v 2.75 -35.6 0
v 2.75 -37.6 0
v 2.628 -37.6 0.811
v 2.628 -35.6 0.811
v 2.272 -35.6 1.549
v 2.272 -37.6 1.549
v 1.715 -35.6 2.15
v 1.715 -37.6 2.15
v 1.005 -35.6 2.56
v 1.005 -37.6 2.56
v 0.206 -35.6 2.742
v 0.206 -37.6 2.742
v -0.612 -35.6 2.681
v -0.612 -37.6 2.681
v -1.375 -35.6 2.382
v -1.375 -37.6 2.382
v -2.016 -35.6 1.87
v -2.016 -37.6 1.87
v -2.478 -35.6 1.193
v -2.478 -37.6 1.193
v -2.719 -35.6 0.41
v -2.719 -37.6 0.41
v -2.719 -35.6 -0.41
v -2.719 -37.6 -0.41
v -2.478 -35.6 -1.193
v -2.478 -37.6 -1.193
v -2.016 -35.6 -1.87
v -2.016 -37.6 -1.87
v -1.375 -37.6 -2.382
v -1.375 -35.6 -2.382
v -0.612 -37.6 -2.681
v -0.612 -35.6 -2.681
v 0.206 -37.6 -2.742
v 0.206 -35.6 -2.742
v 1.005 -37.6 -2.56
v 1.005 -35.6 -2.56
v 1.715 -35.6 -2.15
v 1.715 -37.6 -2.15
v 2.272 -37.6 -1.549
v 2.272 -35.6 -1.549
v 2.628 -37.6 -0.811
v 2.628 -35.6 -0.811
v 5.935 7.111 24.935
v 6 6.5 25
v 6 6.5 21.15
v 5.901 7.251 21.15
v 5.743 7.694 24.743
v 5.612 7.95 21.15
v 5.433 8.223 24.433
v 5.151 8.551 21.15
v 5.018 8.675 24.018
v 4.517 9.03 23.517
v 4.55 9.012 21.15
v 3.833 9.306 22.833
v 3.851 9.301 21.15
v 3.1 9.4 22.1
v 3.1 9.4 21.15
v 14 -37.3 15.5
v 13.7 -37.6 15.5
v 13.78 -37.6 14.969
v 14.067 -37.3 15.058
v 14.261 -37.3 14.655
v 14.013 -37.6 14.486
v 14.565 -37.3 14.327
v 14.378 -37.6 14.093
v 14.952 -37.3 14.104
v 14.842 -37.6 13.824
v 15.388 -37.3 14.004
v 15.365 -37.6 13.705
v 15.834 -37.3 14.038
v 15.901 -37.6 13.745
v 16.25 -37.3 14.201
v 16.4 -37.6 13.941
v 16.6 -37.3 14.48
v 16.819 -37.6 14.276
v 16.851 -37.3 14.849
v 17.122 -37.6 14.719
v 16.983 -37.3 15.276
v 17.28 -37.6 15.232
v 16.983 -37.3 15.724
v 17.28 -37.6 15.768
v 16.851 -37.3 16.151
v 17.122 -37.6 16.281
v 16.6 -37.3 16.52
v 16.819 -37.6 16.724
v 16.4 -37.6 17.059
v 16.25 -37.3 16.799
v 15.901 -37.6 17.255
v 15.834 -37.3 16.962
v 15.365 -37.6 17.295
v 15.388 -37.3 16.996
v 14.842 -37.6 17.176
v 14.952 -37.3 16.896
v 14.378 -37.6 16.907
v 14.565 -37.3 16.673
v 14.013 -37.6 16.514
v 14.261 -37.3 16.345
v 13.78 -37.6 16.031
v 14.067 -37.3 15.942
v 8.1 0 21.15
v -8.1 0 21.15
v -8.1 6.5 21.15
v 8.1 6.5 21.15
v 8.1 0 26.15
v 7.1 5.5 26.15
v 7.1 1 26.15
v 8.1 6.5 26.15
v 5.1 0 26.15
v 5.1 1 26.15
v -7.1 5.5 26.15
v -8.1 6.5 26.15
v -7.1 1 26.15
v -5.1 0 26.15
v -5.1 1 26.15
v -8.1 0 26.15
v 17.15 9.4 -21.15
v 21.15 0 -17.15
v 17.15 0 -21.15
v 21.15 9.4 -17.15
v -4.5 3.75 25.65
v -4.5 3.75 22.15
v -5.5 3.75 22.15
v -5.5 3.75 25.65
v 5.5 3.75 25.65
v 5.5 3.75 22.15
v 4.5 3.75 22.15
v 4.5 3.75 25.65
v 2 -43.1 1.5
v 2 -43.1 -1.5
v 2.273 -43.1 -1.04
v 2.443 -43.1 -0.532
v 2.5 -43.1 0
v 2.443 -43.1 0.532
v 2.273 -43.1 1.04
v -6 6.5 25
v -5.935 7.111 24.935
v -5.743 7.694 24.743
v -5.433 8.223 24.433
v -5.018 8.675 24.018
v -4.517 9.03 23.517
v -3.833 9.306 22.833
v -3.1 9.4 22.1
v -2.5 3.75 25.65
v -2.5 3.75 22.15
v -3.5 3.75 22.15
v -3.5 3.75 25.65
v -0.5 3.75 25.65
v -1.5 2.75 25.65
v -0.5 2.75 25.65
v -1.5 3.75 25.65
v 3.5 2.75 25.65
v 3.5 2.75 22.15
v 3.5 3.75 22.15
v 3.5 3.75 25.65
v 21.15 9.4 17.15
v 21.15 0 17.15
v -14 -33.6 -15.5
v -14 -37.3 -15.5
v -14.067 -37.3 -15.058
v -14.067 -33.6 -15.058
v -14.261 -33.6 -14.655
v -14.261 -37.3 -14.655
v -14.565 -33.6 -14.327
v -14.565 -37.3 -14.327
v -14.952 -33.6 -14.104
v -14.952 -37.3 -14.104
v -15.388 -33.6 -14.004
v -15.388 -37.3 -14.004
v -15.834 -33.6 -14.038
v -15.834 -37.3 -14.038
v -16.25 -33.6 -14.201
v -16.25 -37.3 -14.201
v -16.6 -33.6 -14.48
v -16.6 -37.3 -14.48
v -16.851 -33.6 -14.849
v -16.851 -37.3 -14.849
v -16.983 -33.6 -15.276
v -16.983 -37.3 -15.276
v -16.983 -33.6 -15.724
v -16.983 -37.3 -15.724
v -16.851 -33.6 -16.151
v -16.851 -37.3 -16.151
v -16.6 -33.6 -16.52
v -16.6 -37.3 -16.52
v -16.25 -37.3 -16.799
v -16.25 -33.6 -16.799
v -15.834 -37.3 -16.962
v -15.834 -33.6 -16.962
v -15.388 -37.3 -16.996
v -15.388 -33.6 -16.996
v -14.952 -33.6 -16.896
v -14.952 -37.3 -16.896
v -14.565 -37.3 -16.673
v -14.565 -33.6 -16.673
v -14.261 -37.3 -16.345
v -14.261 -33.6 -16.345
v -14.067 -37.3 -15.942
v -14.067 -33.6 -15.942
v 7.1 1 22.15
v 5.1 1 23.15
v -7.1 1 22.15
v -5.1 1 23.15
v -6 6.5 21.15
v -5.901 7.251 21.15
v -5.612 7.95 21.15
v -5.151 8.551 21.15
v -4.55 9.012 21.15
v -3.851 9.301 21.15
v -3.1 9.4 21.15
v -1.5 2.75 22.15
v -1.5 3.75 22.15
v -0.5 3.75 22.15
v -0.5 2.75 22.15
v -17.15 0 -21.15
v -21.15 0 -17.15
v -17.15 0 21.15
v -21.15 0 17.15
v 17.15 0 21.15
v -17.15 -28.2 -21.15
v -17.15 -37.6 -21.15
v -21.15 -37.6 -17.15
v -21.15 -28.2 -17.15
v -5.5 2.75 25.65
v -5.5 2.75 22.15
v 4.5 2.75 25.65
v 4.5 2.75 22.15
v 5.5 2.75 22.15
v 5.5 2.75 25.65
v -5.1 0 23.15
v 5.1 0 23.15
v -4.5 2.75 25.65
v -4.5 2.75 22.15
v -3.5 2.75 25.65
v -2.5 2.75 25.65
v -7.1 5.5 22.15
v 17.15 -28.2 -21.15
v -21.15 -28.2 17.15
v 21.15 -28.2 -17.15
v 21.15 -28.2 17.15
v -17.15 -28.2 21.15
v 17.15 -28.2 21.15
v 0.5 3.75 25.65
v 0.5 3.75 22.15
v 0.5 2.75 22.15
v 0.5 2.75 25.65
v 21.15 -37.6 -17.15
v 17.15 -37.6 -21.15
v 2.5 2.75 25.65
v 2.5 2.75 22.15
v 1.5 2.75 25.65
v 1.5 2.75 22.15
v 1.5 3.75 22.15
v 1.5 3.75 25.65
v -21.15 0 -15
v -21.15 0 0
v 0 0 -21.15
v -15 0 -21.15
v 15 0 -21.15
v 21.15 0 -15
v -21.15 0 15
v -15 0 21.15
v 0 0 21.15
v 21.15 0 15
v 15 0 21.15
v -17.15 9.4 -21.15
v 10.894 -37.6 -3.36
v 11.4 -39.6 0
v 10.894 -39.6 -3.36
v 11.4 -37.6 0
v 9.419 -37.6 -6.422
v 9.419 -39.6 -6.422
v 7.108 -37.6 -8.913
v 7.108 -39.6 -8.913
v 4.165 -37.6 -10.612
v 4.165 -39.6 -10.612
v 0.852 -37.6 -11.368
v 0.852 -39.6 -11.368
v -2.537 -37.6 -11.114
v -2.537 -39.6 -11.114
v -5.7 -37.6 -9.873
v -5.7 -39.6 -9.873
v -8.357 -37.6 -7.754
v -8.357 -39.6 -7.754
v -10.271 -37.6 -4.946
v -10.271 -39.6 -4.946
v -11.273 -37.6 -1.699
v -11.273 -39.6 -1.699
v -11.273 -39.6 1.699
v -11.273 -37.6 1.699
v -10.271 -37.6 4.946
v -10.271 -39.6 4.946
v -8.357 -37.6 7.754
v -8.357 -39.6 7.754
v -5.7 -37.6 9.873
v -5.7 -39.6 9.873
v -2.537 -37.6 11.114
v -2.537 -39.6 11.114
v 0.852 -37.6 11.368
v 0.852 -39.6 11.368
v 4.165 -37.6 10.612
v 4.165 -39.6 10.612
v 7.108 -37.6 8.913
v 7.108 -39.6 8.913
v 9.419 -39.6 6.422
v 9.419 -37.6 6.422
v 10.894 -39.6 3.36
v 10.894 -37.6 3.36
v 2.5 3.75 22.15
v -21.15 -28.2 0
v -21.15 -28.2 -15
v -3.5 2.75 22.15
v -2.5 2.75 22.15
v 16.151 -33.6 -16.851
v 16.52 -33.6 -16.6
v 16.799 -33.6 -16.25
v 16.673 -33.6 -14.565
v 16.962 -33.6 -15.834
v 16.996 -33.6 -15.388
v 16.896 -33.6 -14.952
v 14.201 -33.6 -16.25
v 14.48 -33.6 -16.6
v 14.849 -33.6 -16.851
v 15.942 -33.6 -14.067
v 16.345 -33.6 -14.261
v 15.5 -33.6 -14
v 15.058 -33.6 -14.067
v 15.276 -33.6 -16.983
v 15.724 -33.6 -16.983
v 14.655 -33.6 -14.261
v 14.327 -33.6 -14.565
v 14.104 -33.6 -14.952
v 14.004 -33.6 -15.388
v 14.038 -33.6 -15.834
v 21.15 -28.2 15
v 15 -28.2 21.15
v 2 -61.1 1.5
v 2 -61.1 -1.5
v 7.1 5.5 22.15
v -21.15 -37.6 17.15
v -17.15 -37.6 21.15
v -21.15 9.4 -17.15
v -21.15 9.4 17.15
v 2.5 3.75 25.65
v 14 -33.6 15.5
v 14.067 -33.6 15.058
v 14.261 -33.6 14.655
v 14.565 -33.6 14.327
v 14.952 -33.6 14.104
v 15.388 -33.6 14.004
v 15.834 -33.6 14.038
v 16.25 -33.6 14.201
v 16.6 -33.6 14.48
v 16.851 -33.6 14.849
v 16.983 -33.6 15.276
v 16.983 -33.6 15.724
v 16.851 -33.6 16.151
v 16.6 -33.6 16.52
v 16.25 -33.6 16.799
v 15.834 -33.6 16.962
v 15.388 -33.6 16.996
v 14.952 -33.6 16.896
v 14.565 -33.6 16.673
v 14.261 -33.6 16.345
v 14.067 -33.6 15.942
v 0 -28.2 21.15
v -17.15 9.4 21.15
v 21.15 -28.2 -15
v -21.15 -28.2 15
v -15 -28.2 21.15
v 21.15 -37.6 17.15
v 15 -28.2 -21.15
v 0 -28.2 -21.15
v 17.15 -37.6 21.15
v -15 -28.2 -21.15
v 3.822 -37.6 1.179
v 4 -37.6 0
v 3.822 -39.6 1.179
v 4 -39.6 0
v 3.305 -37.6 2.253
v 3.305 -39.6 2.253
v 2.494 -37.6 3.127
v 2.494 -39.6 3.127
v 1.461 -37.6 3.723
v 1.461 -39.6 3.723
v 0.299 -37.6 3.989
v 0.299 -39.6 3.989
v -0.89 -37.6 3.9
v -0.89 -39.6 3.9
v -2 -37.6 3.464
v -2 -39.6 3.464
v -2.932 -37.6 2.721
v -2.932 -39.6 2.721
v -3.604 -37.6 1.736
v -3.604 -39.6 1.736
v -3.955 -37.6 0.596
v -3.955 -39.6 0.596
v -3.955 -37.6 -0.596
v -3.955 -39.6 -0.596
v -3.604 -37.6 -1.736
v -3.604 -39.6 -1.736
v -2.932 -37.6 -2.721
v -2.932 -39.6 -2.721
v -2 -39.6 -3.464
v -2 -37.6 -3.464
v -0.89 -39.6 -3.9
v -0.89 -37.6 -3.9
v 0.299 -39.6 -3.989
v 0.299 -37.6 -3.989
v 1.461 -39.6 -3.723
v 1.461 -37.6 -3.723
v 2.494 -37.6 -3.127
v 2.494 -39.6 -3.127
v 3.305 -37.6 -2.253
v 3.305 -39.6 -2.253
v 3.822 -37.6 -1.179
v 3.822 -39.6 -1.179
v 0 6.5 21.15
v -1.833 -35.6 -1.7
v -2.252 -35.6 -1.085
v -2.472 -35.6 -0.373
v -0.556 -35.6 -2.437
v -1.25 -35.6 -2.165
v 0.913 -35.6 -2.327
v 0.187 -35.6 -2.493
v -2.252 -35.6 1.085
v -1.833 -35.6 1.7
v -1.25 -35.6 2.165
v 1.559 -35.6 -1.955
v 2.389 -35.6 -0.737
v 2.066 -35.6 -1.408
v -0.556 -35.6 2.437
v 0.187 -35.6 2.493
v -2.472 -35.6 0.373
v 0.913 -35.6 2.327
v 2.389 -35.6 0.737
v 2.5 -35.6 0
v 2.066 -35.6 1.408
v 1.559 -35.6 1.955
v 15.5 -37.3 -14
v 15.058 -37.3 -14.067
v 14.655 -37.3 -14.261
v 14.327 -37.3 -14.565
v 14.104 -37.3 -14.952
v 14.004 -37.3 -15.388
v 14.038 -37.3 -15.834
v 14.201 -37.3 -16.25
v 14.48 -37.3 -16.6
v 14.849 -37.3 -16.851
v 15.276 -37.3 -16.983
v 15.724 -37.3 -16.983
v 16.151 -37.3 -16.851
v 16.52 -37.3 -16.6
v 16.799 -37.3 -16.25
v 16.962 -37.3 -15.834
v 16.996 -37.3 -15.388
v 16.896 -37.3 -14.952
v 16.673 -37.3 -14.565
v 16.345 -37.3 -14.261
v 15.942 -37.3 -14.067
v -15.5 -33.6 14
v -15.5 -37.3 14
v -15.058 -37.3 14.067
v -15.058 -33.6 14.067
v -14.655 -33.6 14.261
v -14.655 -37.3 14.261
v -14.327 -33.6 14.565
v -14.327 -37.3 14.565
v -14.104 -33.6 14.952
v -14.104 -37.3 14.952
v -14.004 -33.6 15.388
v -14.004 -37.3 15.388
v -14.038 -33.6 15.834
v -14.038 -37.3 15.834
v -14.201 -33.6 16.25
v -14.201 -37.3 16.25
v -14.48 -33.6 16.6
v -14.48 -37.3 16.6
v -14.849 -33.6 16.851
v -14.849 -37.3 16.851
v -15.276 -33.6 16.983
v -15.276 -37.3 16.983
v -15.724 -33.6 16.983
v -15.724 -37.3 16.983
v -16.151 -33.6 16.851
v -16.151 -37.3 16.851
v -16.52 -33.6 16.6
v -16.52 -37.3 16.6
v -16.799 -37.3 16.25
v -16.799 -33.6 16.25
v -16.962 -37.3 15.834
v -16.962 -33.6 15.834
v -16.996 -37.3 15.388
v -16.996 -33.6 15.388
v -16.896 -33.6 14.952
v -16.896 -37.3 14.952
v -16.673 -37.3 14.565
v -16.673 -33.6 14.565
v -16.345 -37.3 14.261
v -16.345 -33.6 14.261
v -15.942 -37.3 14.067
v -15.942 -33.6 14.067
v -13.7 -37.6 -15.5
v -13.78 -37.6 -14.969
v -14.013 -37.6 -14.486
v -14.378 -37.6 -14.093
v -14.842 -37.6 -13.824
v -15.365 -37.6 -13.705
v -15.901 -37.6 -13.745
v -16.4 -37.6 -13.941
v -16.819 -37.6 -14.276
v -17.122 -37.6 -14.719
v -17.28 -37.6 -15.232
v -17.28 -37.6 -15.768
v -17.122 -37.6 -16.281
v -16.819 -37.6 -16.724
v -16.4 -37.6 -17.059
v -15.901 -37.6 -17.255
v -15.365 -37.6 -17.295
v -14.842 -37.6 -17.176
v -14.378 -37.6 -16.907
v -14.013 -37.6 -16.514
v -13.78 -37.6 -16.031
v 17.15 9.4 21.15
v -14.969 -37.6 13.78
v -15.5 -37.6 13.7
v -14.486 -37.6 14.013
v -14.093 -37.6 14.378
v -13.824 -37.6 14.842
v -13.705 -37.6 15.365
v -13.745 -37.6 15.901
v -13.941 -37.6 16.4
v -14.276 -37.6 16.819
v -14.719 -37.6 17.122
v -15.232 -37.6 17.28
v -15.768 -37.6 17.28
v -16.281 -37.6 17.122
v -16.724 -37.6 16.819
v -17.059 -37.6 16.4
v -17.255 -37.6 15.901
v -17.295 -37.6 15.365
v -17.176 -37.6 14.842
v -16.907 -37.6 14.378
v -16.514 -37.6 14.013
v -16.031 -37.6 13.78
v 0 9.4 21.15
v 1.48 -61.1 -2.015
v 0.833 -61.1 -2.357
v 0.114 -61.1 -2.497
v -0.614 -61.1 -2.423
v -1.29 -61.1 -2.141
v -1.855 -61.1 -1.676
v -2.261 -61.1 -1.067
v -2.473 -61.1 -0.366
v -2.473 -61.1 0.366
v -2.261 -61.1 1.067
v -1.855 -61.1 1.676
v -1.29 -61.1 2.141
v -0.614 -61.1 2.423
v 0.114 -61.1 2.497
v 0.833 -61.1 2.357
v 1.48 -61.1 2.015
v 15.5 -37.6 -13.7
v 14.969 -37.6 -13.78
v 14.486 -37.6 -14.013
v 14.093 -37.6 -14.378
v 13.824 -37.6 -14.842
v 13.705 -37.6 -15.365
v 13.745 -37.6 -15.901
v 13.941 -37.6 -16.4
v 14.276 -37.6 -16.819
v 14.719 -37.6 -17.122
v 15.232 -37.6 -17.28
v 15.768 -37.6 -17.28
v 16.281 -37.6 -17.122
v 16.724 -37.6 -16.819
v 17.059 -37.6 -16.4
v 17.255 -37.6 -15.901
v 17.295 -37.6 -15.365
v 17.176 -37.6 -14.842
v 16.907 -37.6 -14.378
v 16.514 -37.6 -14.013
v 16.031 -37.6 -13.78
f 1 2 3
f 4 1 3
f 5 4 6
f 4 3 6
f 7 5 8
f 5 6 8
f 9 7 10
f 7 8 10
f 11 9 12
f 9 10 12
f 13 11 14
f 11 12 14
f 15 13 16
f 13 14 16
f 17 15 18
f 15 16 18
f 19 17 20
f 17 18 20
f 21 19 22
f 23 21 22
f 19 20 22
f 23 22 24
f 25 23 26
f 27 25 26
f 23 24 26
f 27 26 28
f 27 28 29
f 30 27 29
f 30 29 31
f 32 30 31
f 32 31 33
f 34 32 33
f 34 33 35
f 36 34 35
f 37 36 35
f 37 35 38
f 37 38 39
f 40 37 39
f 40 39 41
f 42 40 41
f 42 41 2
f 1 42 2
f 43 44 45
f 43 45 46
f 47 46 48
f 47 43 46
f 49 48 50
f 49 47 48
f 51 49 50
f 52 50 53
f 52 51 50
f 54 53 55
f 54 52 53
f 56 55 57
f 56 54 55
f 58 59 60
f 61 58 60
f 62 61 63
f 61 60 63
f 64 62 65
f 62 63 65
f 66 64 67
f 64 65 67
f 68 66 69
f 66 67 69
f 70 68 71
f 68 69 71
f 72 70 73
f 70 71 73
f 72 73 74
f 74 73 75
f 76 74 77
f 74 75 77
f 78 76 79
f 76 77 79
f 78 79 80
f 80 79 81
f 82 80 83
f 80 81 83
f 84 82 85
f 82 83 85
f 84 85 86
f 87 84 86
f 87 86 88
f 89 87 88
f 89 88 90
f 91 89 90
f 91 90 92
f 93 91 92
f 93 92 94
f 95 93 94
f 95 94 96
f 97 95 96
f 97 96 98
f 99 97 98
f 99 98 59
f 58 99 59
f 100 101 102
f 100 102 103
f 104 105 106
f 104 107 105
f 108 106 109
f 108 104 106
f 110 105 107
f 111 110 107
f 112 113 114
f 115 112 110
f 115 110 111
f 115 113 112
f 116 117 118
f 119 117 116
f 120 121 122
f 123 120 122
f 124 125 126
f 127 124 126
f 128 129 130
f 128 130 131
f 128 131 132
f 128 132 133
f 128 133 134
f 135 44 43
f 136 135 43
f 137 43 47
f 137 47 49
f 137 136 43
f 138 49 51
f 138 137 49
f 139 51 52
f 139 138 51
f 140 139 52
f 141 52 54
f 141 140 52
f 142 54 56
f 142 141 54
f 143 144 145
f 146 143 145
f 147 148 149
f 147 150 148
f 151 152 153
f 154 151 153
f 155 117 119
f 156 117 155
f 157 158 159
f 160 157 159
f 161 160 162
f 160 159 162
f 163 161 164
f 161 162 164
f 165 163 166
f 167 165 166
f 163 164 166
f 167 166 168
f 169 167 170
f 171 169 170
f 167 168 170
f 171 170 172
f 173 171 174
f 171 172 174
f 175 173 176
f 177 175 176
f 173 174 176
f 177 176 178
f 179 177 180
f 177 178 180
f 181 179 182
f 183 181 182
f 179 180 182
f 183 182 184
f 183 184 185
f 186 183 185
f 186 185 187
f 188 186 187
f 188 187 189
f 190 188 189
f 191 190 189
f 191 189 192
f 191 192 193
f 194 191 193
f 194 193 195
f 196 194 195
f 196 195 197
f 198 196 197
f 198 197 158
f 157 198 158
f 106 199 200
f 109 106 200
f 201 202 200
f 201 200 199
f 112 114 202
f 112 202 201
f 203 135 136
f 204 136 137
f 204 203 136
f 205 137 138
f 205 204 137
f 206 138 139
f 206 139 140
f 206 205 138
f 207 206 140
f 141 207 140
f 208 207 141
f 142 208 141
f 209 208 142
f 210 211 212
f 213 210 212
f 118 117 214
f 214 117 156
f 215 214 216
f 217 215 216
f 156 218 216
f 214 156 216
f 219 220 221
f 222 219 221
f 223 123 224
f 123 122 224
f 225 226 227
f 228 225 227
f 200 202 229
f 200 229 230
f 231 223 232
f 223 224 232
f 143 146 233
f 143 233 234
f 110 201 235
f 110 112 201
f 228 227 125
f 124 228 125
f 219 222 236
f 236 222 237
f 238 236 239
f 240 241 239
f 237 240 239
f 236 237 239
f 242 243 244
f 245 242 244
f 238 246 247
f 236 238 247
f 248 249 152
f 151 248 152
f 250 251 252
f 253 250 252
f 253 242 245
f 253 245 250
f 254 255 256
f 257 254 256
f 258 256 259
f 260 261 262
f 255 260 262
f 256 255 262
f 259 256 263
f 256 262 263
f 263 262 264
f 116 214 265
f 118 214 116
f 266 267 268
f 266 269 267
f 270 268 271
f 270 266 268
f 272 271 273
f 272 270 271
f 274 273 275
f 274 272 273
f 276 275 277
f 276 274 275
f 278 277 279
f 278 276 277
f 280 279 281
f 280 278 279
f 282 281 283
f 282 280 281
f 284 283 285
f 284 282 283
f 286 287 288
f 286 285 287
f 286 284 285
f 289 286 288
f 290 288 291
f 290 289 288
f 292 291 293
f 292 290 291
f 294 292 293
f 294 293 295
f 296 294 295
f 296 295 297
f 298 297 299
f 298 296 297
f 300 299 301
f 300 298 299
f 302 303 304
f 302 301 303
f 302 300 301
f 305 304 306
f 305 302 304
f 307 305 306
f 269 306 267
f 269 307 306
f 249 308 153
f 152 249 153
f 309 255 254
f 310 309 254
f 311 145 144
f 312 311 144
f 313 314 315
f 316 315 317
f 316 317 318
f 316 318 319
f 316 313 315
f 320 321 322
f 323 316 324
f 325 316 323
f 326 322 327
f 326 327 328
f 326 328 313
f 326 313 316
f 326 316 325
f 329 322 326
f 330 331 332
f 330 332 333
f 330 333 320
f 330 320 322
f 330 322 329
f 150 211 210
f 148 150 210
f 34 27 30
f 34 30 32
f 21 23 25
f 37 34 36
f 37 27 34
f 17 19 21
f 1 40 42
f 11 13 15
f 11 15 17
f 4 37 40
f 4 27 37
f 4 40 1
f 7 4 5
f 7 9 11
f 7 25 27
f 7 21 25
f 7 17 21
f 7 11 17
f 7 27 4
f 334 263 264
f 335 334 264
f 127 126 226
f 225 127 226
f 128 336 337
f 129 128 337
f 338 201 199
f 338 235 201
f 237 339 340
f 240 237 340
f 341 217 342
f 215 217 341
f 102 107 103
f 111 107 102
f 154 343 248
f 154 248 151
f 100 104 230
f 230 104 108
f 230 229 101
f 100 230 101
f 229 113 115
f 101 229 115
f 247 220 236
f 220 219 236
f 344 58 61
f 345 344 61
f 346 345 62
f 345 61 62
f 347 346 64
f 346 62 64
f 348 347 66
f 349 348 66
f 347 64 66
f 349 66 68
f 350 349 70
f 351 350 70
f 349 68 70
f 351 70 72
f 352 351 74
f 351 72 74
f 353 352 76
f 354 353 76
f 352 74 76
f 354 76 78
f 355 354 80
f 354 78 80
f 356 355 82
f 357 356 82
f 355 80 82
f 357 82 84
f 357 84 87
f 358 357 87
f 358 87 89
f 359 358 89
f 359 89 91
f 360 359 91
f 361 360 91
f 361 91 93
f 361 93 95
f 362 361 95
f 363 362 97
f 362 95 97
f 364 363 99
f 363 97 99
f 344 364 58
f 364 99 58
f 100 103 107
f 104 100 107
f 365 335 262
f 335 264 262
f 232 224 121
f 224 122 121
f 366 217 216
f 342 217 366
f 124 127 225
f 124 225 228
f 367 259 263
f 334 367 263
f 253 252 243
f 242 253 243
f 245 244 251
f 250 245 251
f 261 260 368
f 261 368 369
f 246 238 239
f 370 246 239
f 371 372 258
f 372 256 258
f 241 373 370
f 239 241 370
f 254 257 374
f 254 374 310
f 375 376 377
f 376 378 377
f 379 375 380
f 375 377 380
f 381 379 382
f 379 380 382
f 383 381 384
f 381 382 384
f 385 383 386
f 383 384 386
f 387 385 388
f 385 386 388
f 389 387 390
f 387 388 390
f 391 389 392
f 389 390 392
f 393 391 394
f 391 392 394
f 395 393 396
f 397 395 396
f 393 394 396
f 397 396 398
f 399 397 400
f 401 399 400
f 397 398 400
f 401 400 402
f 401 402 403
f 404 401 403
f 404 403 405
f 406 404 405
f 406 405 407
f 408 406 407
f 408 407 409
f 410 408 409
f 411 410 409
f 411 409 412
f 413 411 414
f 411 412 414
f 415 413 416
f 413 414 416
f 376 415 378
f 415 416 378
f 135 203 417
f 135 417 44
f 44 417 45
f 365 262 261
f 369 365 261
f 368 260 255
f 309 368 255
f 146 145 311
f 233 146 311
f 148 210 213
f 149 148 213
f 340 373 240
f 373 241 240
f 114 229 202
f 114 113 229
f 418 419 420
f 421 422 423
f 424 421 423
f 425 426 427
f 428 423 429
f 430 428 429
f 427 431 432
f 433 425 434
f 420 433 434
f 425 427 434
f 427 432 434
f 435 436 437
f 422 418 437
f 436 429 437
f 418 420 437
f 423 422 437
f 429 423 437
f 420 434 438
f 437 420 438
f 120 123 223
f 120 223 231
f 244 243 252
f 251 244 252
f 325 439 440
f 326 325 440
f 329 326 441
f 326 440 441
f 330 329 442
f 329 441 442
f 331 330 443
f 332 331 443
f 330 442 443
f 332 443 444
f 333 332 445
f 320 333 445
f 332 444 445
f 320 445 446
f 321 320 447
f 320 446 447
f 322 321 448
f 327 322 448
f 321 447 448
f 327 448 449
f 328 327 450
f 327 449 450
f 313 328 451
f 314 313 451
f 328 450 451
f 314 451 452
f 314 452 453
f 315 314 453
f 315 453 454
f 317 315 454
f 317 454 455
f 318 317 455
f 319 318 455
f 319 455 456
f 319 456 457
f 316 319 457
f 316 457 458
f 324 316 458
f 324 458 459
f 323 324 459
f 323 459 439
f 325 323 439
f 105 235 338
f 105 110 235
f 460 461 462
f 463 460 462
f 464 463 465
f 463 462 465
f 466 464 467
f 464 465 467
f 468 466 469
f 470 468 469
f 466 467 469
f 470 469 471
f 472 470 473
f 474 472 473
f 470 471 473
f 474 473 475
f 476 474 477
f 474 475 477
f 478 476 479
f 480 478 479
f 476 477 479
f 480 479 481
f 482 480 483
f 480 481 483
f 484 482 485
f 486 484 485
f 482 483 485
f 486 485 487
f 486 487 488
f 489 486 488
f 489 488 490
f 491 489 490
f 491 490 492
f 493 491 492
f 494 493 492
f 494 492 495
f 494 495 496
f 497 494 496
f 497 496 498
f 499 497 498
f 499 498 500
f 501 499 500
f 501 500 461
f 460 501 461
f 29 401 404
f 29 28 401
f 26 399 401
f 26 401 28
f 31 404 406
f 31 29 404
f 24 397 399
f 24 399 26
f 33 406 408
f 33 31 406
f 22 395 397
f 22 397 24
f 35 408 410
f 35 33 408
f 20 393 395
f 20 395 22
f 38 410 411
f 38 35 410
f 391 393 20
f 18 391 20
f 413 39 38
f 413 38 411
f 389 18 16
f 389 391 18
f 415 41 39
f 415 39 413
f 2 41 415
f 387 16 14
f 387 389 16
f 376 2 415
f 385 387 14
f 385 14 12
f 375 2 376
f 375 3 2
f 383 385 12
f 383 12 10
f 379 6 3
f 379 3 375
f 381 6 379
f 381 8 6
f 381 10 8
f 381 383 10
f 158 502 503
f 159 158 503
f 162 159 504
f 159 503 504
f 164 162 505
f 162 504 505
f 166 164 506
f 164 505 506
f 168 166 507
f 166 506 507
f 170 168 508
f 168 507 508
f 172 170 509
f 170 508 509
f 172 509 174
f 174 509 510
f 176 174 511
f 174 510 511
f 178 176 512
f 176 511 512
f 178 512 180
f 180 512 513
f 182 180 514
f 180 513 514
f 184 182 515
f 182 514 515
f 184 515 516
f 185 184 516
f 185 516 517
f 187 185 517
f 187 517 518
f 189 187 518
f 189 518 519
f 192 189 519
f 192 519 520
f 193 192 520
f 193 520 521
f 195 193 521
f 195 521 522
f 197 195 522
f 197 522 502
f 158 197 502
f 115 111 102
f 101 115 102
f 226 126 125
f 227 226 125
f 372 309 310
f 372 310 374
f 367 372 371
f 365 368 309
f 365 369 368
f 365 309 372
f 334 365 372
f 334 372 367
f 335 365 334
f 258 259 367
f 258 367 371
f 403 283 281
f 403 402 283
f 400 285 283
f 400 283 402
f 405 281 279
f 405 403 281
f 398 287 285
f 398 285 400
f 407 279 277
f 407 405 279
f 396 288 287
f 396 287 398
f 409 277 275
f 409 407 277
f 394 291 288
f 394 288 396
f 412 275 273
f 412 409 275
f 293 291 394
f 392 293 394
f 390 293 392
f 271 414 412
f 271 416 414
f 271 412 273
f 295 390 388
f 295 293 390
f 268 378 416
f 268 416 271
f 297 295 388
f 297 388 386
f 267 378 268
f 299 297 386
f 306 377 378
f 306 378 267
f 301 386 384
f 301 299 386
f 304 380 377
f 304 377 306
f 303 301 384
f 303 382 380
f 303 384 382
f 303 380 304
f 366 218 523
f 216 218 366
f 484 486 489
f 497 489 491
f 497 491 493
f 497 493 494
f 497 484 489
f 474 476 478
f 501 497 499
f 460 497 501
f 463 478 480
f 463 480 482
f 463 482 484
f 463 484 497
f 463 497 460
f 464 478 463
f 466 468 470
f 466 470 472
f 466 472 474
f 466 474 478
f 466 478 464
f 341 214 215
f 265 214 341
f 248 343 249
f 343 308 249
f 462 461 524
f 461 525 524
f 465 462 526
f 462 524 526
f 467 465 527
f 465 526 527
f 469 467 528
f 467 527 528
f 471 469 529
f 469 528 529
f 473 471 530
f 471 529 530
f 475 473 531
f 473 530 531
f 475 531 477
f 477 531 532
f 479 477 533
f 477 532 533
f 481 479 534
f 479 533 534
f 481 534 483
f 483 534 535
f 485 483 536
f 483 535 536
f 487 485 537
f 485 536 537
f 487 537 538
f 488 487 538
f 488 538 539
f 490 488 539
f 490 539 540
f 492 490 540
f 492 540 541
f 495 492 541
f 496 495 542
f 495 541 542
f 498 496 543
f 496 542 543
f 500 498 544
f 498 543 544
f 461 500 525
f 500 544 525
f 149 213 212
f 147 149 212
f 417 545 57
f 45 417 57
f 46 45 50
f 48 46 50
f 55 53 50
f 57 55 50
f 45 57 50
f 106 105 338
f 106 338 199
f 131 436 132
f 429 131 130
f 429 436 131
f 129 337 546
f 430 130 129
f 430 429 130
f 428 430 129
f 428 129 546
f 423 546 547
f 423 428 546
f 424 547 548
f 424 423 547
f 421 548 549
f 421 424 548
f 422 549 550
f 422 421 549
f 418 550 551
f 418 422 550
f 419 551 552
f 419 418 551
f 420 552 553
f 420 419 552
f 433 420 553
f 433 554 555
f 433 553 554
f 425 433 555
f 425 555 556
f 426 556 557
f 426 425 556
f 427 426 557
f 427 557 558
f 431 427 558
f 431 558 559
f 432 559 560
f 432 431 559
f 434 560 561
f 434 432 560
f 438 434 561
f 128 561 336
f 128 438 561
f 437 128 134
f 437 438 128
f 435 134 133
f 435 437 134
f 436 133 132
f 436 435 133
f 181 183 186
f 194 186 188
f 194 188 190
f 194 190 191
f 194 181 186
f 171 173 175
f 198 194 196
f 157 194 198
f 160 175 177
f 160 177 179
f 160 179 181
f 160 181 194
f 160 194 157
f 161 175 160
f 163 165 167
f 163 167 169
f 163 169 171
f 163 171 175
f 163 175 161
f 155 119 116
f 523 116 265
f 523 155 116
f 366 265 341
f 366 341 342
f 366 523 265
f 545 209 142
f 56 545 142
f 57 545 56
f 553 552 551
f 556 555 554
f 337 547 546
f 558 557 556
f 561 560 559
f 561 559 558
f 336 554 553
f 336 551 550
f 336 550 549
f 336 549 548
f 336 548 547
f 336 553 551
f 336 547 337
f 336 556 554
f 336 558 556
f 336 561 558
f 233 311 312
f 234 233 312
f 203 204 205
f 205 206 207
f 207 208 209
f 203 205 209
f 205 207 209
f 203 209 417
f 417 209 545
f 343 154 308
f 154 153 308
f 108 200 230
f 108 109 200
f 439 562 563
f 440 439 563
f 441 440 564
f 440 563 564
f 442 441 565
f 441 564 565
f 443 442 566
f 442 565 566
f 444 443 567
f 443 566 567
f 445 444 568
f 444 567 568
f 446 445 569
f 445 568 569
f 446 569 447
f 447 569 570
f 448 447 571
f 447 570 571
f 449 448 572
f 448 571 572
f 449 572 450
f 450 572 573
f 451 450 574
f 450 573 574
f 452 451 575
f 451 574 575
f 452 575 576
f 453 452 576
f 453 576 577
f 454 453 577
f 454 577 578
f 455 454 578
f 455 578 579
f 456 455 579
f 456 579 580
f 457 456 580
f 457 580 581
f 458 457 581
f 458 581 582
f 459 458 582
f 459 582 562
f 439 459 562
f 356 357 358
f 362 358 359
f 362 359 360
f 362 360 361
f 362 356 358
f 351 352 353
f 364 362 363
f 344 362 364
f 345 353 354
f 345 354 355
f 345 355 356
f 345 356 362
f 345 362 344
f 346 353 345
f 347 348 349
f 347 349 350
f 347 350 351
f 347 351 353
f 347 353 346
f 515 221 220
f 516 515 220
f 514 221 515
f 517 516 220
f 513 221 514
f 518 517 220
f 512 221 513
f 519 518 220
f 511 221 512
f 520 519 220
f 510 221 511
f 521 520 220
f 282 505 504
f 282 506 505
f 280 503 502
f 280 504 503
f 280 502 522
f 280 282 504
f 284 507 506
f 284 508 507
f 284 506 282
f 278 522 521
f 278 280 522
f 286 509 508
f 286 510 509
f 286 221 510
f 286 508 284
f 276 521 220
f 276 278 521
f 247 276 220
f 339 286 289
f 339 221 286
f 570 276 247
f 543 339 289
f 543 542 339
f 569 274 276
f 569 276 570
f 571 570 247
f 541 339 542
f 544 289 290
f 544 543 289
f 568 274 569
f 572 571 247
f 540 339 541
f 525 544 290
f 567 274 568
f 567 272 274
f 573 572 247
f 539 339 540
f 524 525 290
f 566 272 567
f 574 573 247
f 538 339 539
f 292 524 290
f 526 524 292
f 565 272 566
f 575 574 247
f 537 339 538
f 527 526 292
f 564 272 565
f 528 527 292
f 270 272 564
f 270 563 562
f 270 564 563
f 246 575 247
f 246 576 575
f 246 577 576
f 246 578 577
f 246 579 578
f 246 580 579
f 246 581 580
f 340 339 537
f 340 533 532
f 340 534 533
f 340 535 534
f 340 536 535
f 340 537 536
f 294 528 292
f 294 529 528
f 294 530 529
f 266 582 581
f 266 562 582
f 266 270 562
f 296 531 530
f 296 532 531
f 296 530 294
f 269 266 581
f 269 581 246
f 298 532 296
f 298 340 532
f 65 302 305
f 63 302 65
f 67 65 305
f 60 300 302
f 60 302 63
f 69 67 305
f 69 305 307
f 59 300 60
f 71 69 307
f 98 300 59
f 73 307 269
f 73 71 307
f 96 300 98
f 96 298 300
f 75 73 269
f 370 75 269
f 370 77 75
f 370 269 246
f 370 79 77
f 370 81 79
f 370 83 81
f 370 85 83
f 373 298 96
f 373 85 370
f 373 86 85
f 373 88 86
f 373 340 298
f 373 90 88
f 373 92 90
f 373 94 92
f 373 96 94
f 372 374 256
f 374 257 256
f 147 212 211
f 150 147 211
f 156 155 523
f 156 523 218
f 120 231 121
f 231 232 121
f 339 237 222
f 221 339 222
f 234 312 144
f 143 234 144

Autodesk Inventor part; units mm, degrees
ref_plane "YZ Plane" through (0, 0, 0) normal (1, 0, 0) x (0, 1, 0)
ref_plane "XZ Plane" through (0, 0, 0) normal (0, 1, 0) x (-1, 0, 0)
ref_plane "XY Plane" through (0, 0, 0) normal (0, 0, 1) x (1, 0, 0)
sketch "Szkic1" plane through (0, 0, 0) normal (0, 1, 0) x (-1, 0, 0)
  line L0 (-21.15, 21.15) -> (21.15, 21.15)
  line L1 (21.15, 21.15) -> (21.15, -21.15)
  line L2 (21.15, -21.15) -> (-21.15, -21.15)
  line L3 (-21.15, -21.15) -> (-21.15, 21.15)
  line L4 (-21.15, 21.15) -> (21.15, -21.15) construction
  line L5 (21.15, 21.15) -> (-21.15, -21.15) construction
  point P0 (0, 0)
  dimension "d0" = 42.3
  dimension "d1" = 42.3
extrude "Wyciągnięcie proste1" add sketch "Szkic1" along normal blind 9.4
chamfer "Faza1" distance 4 angle 45 4 edges at (21.15, 4.7, 21.15) (-21.15, 4.7, 21.15) (-21.15, 4.7, -21.15) (21.15, 4.7, -21.15)
sketch "Szkic2" plane through (0, 0, 0) normal (0, -1, 0) x (1, 0, 0)
  line L0 (21.15, -17.15) -> (17.15, -21.15) projected
  line L1 (21.15, -17.15) -> (21.15, 17.15) projected
  line L2 (17.15, 21.15) -> (21.15, 17.15) projected
  line L3 (17.15, 21.15) -> (-17.15, 21.15) projected
  line L4 (-21.15, 17.15) -> (-17.15, 21.15) projected
  line L5 (-21.15, 17.15) -> (-21.15, -17.15) projected
  line L6 (-17.15, -21.15) -> (-21.15, -17.15) projected
  line L7 (-17.15, -21.15) -> (17.15, -21.15) projected
  line L8 (21.15, -17.15) -> (21.15, 17.15) projected
  line L9 (21.15, 15) -> (21.15, -15)
  line L10 (17.15, -21.15) -> (-17.15, -21.15) projected
  line L11 (0, -21.15) -> (15, -21.15)
  line L12 (0, -21.15) -> (-15, -21.15)
  line L13 (-21.15, -17.15) -> (-21.15, 17.15) projected
  line L14 (-21.15, 0) -> (-21.15, -15)
  line L15 (-21.15, 0) -> (-21.15, 15)
  line L16 (-17.15, 21.15) -> (17.15, 21.15) projected
  line L17 (0, 21.15) -> (-15, 21.15)
  line L18 (0, 21.15) -> (15, 21.15)
  line L19 (21.15, 15) -> (15, 21.15)
  line L20 (21.15, -15) -> (15, -21.15)
  line L21 (-15, -21.15) -> (-21.15, -15)
  line L22 (-21.15, 15) -> (-15, 21.15)
  point P0 (0, 0)
extrude "Wyciągnięcie proste2" add sketch "Szkic2" along normal blind 28.2 separate body contours L20 L7 L21 L5 L22 L3 L19 L1
sketch "Szkic3" plane through (0, -28.2, 0) normal (0, -1, 0) x (1, 0, 0)
  line L0 (21.15, -17.15) -> (17.15, -21.15) projected
  line L1 (21.15, -17.15) -> (21.15, 17.15) projected
  line L2 (17.15, 21.15) -> (21.15, 17.15) projected
  line L3 (17.15, 21.15) -> (-17.15, 21.15) projected
  line L4 (-21.15, 17.15) -> (-17.15, 21.15) projected
  line L5 (-21.15, 17.15) -> (-21.15, -17.15) projected
  line L6 (-17.15, -21.15) -> (-21.15, -17.15) projected
  line L7 (-17.15, -21.15) -> (17.15, -21.15) projected
  point P0 (0, 0)
extrude "Wyciągnięcie proste3" add sketch "Szkic3" along normal blind 9.4 separate body
sketch "Szkic4" plane through (0, -37.6, 0) normal (0, -1, 0) x (1, 0, 0)
  circle A0 centre (0, 0) radius 11.4
  dimension "d11" = 22.8
extrude "Wyciągnięcie proste4" add sketch "Szkic4" along normal blind 2 bodies 3
sketch "Szkic5" plane through (0, -39.6, 0) normal (0, -1, 0) x (1, 0, 0)
  circle A0 centre (0, 0) radius 4
  dimension "d14" = 8
extrude "Wyciągnięcie proste5" cut sketch "Szkic5" against normal blind 2 bodies 3
sketch "Szkic6" plane through (0, -37.6, 0) normal (0, -1, 0) x (1, 0, 0)
  circle A0 centre (0, 0) radius 2.75
  dimension "d17" = 5.5
extrude "Wyciągnięcie proste6" cut sketch "Szkic6" against normal blind 2 bodies 3
sketch "Szkic7" plane through (0, -35.6, 0) normal (0, -1, 0) x (1, 0, 0)
  circle A0 centre (0, 0) radius 2.5
  dimension "d20" = 5
extrude "Wyciągnięcie proste7" add sketch "Szkic7" along normal blind 25.5 separate body
sketch "Szkic8" plane through (0, -61.1, 0) normal (0, -1, 0) x (1, 0, 0)
  circle A0 centre (0, 0) radius 2.5 projected
  line L0 (2, 1.5) -> (2, -1.5)
  dimension "d23" = 4.5
extrude "Wyciągnięcie proste8" cut sketch "Szkic8" against normal blind 18 contours A0 L0 picked at (2.0912, -0.3466) bodies 4
sketch "Szkic9" plane through (0, -37.6, 0) normal (0, -1, 0) x (1, 0, 0)
  circle A0 centre (-15.5, -15.5) radius 1.5
  arc A1 (2, 1.5) -> (2, -1.5) centre (0, 0) ccw projected
  dimension "d26" = 3
  dimension "d27" = 15.5
  dimension "d28" = 15.5
extrude "Wyciągnięcie proste9" cut sketch "Szkic9" against normal blind 4 bodies 3
pattern_circular "Szyk kołowy1" count 4 over 360 about axis through (0, -35.6, 0) along (0, -1, 0) of "Wyciągnięcie proste9" bodies 3
thread "Gwint1" size "M3x0.5" class "6H" standard "ANSI Metric M Profile" full length
thread "Gwint2" size "M3x0.5" class "6H" standard "ANSI Metric M Profile" full length
thread "Gwint3" size "M3x0.5" class "6H" standard "ANSI Metric M Profile" full length
thread "Gwint4" size "M3x0.5" class "6H" standard "ANSI Metric M Profile" full length
chamfer "Faza2" distance 0.3 angle 45 4 edges at (-17, -37.6, -15.5) (-15.5, -37.6, 17) (15.5, -37.6, -17) (17, -37.6, 15.5)
sketch "Szkic10" plane through (0, 0, 0) normal (0, 1, 0) x (-1, 0, 0)
  line L0 (17.15, 21.15) -> (-17.15, 21.15) projected
  line L1 (0, 21.15) -> (-8.1, 21.15)
  line L2 (-8.1, 21.15) -> (-8.1, 26.15)
  line L3 (-8.1, 26.15) -> (8.1, 26.15)
  line L4 (8.1, 26.15) -> (8.1, 21.15)
  line L5 (0, 21.15) -> (8.1, 21.15)
  point P0 (0, 0)
  dimension "d45" = 8.1
  dimension "d46" = 5
  dimension "d47" = 16.2
extrude "Wyciągnięcie proste10" add sketch "Szkic10" along normal blind 6.5 separate body
sketch "Szkic11" plane through (0, 9.4, 0) normal (0, 1, 0) x (1, 0, 0)
  line L0 (-17.15, -21.15) -> (17.15, -21.15) projected
  line L1 (0, -21.15) -> (6, -21.15)
  line L2 (6, -21.15) -> (6, -25)
  line L3 (6, -25) -> (-6, -25)
  line L4 (-6, -25) -> (-6, -21.15)
  line L5 (-6, -21.15) -> (0, -21.15)
  point P0 (0, 0)
  dimension "d50" = 3.85
  dimension "d51" = 12
  dimension "d52" = 11.15
extrude "Wyciągnięcie proste11" add sketch "Szkic11" against normal blind 2.9 separate body
fillet "Zaokrąglenie1" radius 2.9 3 edges at (6, 9.4, 23.075) (0, 9.4, 25) (-6, 9.4, 23.075)
sketch "Szkic12" plane through (-8.1, 0, 26.15) normal (0, 0, 1) x (1, 0, 0)
  line L0 (0, 0) -> (16.2, 0) projected
  line L1 (16.2, 0) -> (16.2, 6.5) projected
  line L2 (0, 6.5) -> (16.2, 6.5) projected
  line L3 (0, 0) -> (0, 6.5) projected
  line L4 (15.2, 1) -> (1, 1)
  line L5 (1, 1) -> (1, 5.5)
  line L6 (1, 5.5) -> (15.2, 5.5)
  line L7 (15.2, 5.5) -> (15.2, 1)
  point P0 (8.1, 0)
  dimension "d56" = 1
extrude "Wyciągnięcie proste12" cut sketch "Szkic12" against normal blind 4 contours L4 L5 L6 L7 bodies 5
sketch "Szkic13" plane through (-8.1, 0, 26.15) normal (0, 0, 1) x (1, 0, 0)
  line L0 (0, 0) -> (16.2, 0) projected
  line L1 (-6.9, 0) -> (23.1, 0) projected
  line L2 (15.2, 1) -> (1, 1) projected
  line L3 (13.2, 0) -> (3, 0)
  line L4 (3, 0) -> (3, 1)
  line L5 (3, 1) -> (13.2, 1)
  line L6 (13.2, 1) -> (13.2, 0)
  line L7 (15.2, 5.5) -> (15.2, 1) projected
  line L8 (1, 1) -> (1, 5.5) projected
  point P0 (8.1, 0)
  dimension "d59" = 2
  dimension "d60" = 2
extrude "Wyciągnięcie proste13" cut sketch "Szkic13" against normal blind 3 bodies 5
sketch "Szkic14" plane through (-8.1, 0, 22.15) normal (0, 0, 1) x (1, 0, 0)
  line L0 (15.2, 1) -> (13.2, 1) projected
  line L1 (15.2, 5.5) -> (15.2, 1) projected
  line L2 (15.2, 1) -> (1, 1) projected
  line L3 (15.2, 5.5) -> (15.2, 1) projected
  line L4 (1, 5.5) -> (15.2, 5.5) projected
  line L5 (1, 1) -> (1, 5.5) projected
  line L6 (15.2, 3.25) -> (1, 3.25)
  line L7 (13.6, 3.75) -> (12.6, 3.75)
  line L8 (12.6, 3.75) -> (12.6, 2.75)
  line L9 (12.6, 2.75) -> (13.6, 2.75)
  line L10 (13.6, 2.75) -> (13.6, 3.75)
  line L11 (13.6, 3.75) -> (12.6, 2.75) construction
  line L12 (12.6, 3.75) -> (13.6, 2.75) construction
  point P0 (8.1, 0)
  point P1 (13.1, 3.25)
  dimension "d63" = 1
  dimension "d64" = 2.1
  dimension "d65" = 1
extrude "Wyciągnięcie proste14" add sketch "Szkic14" along normal blind 3.5 separate body contours L10 L9 L8 L6 | L6 L8 L7 L10
pattern_linear "Szyk prostokątny1" count 6 spacing 2 along (-1, 0, 0) of "Wyciągnięcie proste14" bodies 7
properties part number "Nema_17"
